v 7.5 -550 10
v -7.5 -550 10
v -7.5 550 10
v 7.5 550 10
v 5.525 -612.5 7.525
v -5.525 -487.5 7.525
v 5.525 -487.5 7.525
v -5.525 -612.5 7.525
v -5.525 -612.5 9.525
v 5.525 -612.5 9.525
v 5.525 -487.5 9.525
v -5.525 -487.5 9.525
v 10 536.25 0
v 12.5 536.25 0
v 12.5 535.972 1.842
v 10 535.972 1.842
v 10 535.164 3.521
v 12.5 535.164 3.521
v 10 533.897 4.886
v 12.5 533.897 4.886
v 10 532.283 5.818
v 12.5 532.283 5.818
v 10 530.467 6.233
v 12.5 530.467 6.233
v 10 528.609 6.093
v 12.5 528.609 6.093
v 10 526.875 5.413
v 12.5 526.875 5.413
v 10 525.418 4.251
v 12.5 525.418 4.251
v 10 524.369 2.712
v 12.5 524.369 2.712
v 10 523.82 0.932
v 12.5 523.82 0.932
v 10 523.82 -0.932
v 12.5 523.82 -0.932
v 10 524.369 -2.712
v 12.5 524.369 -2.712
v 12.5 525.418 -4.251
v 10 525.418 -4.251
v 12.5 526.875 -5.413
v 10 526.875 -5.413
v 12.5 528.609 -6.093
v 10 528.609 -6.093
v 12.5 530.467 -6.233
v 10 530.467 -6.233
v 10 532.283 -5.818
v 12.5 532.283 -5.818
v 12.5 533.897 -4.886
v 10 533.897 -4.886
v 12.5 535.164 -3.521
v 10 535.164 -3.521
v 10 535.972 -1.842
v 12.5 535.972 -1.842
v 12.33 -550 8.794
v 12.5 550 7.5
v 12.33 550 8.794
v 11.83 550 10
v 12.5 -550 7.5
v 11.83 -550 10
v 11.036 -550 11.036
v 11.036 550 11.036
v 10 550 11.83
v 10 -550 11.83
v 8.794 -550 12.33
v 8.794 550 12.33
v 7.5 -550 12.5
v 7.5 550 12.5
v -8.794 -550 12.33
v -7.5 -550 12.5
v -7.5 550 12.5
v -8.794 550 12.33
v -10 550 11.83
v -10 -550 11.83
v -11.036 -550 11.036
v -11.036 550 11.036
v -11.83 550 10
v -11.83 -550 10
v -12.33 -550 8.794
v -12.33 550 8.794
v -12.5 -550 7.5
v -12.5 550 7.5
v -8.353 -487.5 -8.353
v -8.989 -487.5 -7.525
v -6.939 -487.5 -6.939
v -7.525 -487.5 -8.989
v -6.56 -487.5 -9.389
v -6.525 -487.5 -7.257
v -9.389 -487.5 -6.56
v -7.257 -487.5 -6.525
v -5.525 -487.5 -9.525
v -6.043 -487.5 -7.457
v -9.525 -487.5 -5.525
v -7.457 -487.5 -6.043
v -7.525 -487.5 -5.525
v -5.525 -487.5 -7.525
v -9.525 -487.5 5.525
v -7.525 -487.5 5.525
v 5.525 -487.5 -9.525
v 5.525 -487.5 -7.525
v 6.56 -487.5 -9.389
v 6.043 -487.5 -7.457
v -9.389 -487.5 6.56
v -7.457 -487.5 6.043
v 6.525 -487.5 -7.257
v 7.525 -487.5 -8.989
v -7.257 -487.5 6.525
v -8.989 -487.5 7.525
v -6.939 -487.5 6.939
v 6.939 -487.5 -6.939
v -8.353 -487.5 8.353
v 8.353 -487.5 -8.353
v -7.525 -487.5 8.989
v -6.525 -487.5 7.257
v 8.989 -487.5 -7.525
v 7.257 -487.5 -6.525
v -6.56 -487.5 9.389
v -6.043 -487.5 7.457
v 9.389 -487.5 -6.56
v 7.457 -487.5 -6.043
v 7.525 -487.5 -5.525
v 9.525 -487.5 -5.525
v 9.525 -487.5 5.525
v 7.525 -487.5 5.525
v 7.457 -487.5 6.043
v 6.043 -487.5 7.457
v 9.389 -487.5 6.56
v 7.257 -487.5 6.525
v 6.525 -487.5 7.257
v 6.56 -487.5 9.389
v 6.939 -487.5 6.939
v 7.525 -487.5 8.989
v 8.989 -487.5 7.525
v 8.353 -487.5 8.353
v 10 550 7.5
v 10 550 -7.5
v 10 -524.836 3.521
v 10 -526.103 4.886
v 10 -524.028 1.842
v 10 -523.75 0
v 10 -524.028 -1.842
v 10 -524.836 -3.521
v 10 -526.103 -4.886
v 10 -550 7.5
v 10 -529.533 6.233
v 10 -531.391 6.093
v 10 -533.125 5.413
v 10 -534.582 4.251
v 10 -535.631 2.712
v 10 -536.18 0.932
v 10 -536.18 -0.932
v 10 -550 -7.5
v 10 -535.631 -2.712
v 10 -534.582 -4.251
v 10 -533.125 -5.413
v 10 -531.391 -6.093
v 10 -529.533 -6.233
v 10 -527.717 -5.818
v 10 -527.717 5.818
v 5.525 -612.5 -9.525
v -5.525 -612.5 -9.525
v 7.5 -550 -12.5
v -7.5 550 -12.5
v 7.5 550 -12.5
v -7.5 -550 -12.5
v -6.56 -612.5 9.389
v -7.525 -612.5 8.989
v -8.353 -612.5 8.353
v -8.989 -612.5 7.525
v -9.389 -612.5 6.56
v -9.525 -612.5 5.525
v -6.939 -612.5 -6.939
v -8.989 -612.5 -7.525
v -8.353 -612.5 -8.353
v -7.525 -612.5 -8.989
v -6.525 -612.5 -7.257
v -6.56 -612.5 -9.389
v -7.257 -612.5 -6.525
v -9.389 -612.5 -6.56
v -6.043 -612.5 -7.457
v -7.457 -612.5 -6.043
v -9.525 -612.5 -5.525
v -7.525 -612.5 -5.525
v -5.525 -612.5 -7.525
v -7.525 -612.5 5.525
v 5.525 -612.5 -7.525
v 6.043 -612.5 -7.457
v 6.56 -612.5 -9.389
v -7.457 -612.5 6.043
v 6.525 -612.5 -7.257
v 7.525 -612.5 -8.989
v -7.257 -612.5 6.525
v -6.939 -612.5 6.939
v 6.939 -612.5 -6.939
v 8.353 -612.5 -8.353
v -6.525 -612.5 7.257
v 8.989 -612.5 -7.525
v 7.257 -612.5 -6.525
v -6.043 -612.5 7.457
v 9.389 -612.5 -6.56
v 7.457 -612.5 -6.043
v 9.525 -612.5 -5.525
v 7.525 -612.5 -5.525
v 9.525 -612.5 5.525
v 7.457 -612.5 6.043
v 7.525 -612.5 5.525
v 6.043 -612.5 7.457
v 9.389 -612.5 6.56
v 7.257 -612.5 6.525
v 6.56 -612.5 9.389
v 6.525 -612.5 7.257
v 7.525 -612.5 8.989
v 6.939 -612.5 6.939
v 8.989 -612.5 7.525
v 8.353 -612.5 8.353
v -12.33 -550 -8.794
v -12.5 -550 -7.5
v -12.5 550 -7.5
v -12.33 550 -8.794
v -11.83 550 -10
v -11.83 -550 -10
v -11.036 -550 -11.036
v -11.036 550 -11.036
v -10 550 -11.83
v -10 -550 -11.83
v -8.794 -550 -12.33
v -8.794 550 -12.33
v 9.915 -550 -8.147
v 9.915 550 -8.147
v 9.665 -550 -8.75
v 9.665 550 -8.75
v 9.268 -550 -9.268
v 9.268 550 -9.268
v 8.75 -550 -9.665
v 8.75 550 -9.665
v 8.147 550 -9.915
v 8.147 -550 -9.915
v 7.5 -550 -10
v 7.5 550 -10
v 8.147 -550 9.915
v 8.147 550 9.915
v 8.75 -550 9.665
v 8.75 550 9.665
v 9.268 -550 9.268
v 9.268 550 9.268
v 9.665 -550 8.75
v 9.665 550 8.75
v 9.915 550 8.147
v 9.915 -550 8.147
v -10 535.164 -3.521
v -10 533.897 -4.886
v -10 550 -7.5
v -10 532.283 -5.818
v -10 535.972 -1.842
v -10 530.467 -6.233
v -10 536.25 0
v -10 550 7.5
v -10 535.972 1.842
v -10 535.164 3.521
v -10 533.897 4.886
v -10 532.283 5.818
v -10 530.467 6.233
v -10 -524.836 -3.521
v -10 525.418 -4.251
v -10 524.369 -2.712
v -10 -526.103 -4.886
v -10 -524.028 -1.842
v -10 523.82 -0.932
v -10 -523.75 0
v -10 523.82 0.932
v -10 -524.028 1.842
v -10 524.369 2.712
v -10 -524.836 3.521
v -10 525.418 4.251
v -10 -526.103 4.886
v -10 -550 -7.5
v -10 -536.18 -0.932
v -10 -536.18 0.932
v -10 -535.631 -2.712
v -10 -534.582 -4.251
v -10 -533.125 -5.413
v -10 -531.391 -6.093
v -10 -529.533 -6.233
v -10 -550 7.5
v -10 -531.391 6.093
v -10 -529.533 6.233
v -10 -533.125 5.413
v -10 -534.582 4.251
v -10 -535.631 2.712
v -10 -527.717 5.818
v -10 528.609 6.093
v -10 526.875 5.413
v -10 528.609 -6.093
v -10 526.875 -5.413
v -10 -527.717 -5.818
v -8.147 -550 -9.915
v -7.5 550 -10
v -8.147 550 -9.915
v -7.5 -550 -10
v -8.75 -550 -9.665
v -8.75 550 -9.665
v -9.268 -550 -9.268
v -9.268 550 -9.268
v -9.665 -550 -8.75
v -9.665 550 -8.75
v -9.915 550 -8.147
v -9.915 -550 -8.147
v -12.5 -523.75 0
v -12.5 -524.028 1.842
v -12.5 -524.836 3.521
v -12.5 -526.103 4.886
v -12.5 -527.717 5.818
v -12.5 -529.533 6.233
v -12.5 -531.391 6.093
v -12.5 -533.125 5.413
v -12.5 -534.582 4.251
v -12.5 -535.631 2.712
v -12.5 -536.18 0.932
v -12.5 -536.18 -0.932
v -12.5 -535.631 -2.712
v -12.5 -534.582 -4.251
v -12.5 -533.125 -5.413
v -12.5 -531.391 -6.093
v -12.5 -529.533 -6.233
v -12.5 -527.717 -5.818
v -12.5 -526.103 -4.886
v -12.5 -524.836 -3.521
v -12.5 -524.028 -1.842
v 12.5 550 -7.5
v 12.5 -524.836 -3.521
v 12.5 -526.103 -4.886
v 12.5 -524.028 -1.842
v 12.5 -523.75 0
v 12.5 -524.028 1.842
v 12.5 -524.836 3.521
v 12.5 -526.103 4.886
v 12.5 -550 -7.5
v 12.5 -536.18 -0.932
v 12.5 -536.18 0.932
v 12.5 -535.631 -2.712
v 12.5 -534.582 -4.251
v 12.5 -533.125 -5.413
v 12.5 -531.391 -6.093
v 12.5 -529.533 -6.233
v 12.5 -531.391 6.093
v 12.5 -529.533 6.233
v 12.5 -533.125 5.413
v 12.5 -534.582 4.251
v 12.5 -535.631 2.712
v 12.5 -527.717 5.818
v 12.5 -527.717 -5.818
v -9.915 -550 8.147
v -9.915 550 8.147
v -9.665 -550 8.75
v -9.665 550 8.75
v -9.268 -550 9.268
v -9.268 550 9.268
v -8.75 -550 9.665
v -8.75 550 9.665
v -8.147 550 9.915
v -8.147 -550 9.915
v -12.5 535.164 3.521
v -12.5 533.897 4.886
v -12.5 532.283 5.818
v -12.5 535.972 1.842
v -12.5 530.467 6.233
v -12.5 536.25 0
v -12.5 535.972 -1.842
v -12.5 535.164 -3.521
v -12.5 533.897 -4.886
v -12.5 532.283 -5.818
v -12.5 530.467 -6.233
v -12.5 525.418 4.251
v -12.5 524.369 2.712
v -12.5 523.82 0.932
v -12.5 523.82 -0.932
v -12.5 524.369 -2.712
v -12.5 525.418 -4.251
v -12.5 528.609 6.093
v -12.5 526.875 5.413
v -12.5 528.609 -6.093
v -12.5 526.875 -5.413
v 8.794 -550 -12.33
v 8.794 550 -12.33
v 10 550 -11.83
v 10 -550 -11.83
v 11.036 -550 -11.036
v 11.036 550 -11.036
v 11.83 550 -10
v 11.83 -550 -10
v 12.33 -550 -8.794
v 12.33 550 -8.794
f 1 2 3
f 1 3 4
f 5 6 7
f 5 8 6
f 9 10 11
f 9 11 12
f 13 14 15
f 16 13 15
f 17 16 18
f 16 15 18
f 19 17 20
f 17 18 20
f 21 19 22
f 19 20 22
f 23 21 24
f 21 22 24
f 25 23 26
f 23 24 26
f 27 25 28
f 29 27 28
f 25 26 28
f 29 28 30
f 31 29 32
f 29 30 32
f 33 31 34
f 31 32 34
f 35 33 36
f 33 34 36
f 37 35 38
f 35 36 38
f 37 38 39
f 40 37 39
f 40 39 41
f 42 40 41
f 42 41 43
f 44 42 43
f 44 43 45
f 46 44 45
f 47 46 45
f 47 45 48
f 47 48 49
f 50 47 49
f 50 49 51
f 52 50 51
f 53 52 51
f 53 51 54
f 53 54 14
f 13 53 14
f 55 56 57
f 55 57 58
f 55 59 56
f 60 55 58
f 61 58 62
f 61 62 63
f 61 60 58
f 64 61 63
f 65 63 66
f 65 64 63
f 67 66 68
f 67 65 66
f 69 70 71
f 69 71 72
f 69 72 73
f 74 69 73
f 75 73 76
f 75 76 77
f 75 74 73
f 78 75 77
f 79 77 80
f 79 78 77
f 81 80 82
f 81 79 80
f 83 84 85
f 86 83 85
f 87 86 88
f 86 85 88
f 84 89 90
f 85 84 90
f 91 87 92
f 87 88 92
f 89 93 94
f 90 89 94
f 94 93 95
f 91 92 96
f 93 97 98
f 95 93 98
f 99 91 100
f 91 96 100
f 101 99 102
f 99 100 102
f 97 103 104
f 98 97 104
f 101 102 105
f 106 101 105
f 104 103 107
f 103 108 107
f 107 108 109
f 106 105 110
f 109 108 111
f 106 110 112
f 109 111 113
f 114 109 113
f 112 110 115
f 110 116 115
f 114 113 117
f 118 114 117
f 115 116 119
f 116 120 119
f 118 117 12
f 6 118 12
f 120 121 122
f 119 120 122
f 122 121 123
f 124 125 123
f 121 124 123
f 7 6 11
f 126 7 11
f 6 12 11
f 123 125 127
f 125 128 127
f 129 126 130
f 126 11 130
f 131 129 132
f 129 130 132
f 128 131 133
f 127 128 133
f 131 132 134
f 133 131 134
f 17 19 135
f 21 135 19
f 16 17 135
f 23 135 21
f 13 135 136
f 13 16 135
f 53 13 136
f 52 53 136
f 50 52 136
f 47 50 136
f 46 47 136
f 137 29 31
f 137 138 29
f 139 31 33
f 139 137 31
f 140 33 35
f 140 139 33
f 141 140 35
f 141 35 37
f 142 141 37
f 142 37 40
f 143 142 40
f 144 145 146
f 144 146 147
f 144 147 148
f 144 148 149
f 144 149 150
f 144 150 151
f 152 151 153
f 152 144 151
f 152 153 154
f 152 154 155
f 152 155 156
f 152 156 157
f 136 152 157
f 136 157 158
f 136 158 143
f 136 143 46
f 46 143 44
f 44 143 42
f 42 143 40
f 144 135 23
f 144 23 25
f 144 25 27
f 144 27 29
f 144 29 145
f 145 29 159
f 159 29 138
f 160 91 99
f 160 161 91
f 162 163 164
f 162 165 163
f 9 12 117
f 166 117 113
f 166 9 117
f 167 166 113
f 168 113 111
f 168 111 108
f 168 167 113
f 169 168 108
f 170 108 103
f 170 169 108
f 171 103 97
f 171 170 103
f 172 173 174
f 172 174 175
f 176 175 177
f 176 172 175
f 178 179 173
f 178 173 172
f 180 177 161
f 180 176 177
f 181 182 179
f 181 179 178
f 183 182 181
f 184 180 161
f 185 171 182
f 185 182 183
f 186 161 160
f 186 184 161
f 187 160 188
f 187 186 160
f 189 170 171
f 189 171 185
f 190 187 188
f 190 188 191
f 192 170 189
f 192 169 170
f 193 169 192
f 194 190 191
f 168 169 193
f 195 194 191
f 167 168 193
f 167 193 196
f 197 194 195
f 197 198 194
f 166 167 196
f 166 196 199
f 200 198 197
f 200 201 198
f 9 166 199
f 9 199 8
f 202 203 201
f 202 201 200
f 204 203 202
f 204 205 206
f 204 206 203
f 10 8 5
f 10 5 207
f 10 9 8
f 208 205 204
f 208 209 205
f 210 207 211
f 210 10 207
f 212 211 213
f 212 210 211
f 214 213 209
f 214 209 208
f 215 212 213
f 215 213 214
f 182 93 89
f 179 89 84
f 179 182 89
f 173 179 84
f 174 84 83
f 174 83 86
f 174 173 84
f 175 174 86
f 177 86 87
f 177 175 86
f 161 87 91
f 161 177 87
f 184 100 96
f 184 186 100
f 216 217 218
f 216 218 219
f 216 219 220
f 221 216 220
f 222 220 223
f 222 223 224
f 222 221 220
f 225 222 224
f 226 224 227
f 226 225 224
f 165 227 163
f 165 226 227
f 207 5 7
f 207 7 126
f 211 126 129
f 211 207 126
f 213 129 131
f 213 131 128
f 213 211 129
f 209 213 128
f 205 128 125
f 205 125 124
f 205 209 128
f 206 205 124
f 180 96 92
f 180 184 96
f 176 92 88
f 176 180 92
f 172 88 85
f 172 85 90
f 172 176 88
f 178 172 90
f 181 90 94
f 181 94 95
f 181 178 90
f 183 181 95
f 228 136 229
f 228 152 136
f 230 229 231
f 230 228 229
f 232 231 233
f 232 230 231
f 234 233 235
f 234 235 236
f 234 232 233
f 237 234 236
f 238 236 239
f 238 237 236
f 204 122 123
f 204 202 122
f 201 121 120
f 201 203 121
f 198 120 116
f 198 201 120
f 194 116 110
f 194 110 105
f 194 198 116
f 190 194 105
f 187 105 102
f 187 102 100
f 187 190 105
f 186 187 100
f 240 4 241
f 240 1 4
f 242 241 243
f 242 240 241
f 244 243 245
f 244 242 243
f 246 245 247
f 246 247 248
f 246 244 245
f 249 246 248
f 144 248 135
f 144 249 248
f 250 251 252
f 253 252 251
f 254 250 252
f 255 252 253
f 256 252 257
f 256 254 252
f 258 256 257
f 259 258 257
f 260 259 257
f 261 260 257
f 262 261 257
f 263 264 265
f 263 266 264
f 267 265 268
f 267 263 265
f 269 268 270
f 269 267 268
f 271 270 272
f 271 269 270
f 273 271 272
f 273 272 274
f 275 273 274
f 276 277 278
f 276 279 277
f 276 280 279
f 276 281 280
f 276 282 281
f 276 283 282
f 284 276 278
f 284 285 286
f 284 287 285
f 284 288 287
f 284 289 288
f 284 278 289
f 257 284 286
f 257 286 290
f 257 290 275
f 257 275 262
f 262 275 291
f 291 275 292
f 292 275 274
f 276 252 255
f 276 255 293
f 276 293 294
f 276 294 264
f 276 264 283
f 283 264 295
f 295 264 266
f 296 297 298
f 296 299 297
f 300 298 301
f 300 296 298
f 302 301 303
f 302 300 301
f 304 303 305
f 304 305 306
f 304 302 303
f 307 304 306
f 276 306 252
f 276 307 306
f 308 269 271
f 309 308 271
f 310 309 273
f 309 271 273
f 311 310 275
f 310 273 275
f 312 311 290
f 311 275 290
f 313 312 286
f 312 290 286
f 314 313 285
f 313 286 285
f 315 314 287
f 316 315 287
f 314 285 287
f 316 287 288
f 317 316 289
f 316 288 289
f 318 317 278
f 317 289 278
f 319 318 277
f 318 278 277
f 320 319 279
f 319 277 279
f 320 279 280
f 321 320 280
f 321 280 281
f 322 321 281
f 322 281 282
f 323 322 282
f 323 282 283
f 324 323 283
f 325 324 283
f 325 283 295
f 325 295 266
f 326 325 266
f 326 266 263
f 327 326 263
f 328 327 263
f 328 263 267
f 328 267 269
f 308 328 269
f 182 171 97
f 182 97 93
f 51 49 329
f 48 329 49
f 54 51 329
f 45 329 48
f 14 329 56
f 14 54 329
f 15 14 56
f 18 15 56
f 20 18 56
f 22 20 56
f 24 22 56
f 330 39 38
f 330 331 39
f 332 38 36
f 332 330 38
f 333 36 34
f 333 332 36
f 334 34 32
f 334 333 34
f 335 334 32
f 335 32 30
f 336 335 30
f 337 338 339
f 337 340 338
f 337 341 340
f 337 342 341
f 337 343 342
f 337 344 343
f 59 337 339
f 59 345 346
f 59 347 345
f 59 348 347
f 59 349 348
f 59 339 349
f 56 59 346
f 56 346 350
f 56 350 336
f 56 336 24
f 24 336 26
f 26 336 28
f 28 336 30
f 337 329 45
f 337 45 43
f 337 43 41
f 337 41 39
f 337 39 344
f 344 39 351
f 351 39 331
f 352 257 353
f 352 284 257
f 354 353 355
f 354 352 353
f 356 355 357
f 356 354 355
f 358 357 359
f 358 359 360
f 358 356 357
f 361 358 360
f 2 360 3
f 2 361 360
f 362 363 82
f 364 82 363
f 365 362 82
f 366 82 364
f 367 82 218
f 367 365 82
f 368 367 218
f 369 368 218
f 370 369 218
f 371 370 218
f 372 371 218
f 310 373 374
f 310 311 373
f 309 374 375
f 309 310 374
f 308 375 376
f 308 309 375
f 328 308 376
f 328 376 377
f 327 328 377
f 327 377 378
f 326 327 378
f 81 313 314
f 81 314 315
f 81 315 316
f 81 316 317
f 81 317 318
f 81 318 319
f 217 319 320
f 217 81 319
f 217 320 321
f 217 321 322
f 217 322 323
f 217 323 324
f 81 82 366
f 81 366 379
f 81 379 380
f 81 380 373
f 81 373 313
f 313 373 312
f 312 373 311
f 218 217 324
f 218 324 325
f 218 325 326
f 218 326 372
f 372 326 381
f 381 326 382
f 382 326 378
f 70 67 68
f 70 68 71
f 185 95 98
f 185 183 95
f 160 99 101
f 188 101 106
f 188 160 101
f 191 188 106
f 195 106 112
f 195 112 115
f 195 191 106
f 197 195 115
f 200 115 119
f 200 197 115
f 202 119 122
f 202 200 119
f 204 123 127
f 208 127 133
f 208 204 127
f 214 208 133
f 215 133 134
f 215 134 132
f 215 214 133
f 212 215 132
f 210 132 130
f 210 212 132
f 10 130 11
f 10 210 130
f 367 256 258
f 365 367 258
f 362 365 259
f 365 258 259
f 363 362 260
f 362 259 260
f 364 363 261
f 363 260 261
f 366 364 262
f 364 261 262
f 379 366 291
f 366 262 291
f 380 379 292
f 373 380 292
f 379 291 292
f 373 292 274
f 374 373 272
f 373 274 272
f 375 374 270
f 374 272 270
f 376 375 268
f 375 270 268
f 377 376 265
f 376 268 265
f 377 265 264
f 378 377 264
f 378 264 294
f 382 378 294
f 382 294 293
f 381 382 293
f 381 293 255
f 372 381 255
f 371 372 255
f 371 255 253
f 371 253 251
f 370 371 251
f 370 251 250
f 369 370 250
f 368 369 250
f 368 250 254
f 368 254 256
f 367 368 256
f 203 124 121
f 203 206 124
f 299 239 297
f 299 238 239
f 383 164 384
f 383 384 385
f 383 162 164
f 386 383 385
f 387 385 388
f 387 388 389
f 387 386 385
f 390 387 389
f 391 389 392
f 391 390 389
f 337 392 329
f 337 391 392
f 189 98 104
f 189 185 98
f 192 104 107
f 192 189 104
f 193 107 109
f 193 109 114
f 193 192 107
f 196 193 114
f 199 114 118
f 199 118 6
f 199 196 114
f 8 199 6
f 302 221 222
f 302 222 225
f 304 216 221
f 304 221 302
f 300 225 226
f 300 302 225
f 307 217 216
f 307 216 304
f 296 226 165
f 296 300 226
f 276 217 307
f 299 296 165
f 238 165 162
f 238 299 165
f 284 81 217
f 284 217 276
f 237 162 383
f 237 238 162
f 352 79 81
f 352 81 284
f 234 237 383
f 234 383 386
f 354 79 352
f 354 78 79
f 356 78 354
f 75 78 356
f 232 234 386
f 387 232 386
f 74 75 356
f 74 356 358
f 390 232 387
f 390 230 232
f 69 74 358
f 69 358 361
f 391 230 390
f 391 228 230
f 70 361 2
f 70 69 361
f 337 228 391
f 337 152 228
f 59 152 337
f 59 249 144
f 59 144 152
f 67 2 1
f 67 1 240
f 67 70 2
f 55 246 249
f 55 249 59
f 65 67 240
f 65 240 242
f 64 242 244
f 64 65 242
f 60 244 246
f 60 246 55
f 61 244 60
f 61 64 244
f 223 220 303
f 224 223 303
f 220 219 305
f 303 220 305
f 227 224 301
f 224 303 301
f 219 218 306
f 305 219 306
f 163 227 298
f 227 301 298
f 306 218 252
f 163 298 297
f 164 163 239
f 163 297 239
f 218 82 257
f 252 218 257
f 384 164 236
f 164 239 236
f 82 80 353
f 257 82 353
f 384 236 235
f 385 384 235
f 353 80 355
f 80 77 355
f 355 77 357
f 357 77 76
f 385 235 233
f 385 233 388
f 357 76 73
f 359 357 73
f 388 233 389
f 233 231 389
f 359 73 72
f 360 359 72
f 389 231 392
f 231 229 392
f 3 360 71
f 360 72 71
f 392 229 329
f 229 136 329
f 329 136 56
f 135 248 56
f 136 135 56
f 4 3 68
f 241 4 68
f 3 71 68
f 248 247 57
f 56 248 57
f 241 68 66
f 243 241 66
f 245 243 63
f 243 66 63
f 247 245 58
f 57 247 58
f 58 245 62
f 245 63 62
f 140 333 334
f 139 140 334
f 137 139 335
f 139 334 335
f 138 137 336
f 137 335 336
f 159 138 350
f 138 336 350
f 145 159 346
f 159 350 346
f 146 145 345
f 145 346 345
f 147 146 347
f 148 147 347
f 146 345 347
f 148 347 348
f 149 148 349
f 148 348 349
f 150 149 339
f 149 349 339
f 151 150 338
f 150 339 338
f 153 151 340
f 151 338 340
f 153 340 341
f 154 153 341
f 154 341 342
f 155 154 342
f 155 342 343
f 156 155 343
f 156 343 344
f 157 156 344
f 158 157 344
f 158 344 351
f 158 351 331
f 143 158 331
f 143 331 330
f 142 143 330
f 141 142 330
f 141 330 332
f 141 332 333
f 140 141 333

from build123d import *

# Parameters (mm, degrees)
F1_DEPTH = 550
F2_R     = 6.25
F3_DEPTH = 25.001
F5_DEPTH = 62.5


with BuildPart() as f1:
    # F0 (on Front) → F1 (new body, symmetric)
    with BuildSketch(Plane.XZ):
        with BuildLine():
            ThreePointArc((12.5, 7.5), (11.035534, 11.035534), (7.5, 12.5))
            Line((7.5, 12.5), (-7.5, 12.5))
            ThreePointArc((-7.5, 12.5), (-11.035534, 11.035534), (-12.5, 7.5))
            Line((-12.5, 7.5), (-12.5, -7.5))
            ThreePointArc((-12.5, -7.5), (-11.035534, -11.035534), (-7.5, -12.5))
            Line((-7.5, -12.5), (7.5, -12.5))
            ThreePointArc((7.5, -12.5), (11.035534, -11.035534), (12.5, -7.5))
            Line((12.5, -7.5), (12.5, 7.5))
        make_face()
        with BuildLine():
            Line((-7.5, 10), (7.5, 10))
            ThreePointArc((7.5, 10), (9.267767, 9.267767), (10, 7.5))
            Line((10, 7.5), (10, -7.5))
            ThreePointArc((10, -7.5), (9.267767, -9.267767), (7.5, -10))
            Line((7.5, -10), (-7.5, -10))
            ThreePointArc((-7.5, -10), (-9.267767, -9.267767), (-10, -7.5))
            Line((-10, -7.5), (-10, 7.5))
            ThreePointArc((-10, 7.5), (-9.267767, 9.267767), (-7.5, 10))
        make_face(mode=Mode.SUBTRACT)
    extrude(amount=F1_DEPTH, both=True)

    # F2 (on face) → F3 (cut, through all)
    with BuildSketch(Plane.YZ.offset(12.5)):
        with Locations((-530, 0)):
            Circle(F2_R)
        with Locations((530, 0)):
            Circle(F2_R)
    extrude(amount=-F3_DEPTH, mode=Mode.SUBTRACT)


with BuildPart() as f5:
    # F4 (on face) → F5 (new body, symmetric)
    with BuildSketch(Plane.XZ.offset(550)):
        with BuildLine():
            ThreePointArc((9.525, 5.525), (8.353427, 8.353427), (5.525, 9.525))
            Line((5.525, 9.525), (-5.525, 9.525))
            ThreePointArc((-5.525, 9.525), (-8.353427, 8.353427), (-9.525, 5.525))
            Line((-9.525, 5.525), (-9.525, -5.525))
            ThreePointArc((-9.525, -5.525), (-8.353427, -8.353427), (-5.525, -9.525))
            Line((-5.525, -9.525), (5.525, -9.525))
            ThreePointArc((5.525, -9.525), (8.353427, -8.353427), (9.525, -5.525))
            Line((9.525, -5.525), (9.525, 5.525))
        make_face()
        with BuildLine():
            ThreePointArc((5.525, 7.525), (6.939214, 6.939214), (7.525, 5.525))
            Line((7.525, 5.525), (7.525, -5.525))
            ThreePointArc((7.525, -5.525), (6.939214, -6.939214), (5.525, -7.525))
            Line((5.525, -7.525), (-5.525, -7.525))
            ThreePointArc((-5.525, -7.525), (-6.939214, -6.939214), (-7.525, -5.525))
            Line((-7.525, -5.525), (-7.525, 5.525))
            ThreePointArc((-7.525, 5.525), (-6.939214, 6.939214), (-5.525, 7.525))
            Line((-5.525, 7.525), (5.525, 7.525))
        make_face(mode=Mode.SUBTRACT)
    extrude(amount=F5_DEPTH, both=True)


solid = Compound([f1.part, f5.part])
